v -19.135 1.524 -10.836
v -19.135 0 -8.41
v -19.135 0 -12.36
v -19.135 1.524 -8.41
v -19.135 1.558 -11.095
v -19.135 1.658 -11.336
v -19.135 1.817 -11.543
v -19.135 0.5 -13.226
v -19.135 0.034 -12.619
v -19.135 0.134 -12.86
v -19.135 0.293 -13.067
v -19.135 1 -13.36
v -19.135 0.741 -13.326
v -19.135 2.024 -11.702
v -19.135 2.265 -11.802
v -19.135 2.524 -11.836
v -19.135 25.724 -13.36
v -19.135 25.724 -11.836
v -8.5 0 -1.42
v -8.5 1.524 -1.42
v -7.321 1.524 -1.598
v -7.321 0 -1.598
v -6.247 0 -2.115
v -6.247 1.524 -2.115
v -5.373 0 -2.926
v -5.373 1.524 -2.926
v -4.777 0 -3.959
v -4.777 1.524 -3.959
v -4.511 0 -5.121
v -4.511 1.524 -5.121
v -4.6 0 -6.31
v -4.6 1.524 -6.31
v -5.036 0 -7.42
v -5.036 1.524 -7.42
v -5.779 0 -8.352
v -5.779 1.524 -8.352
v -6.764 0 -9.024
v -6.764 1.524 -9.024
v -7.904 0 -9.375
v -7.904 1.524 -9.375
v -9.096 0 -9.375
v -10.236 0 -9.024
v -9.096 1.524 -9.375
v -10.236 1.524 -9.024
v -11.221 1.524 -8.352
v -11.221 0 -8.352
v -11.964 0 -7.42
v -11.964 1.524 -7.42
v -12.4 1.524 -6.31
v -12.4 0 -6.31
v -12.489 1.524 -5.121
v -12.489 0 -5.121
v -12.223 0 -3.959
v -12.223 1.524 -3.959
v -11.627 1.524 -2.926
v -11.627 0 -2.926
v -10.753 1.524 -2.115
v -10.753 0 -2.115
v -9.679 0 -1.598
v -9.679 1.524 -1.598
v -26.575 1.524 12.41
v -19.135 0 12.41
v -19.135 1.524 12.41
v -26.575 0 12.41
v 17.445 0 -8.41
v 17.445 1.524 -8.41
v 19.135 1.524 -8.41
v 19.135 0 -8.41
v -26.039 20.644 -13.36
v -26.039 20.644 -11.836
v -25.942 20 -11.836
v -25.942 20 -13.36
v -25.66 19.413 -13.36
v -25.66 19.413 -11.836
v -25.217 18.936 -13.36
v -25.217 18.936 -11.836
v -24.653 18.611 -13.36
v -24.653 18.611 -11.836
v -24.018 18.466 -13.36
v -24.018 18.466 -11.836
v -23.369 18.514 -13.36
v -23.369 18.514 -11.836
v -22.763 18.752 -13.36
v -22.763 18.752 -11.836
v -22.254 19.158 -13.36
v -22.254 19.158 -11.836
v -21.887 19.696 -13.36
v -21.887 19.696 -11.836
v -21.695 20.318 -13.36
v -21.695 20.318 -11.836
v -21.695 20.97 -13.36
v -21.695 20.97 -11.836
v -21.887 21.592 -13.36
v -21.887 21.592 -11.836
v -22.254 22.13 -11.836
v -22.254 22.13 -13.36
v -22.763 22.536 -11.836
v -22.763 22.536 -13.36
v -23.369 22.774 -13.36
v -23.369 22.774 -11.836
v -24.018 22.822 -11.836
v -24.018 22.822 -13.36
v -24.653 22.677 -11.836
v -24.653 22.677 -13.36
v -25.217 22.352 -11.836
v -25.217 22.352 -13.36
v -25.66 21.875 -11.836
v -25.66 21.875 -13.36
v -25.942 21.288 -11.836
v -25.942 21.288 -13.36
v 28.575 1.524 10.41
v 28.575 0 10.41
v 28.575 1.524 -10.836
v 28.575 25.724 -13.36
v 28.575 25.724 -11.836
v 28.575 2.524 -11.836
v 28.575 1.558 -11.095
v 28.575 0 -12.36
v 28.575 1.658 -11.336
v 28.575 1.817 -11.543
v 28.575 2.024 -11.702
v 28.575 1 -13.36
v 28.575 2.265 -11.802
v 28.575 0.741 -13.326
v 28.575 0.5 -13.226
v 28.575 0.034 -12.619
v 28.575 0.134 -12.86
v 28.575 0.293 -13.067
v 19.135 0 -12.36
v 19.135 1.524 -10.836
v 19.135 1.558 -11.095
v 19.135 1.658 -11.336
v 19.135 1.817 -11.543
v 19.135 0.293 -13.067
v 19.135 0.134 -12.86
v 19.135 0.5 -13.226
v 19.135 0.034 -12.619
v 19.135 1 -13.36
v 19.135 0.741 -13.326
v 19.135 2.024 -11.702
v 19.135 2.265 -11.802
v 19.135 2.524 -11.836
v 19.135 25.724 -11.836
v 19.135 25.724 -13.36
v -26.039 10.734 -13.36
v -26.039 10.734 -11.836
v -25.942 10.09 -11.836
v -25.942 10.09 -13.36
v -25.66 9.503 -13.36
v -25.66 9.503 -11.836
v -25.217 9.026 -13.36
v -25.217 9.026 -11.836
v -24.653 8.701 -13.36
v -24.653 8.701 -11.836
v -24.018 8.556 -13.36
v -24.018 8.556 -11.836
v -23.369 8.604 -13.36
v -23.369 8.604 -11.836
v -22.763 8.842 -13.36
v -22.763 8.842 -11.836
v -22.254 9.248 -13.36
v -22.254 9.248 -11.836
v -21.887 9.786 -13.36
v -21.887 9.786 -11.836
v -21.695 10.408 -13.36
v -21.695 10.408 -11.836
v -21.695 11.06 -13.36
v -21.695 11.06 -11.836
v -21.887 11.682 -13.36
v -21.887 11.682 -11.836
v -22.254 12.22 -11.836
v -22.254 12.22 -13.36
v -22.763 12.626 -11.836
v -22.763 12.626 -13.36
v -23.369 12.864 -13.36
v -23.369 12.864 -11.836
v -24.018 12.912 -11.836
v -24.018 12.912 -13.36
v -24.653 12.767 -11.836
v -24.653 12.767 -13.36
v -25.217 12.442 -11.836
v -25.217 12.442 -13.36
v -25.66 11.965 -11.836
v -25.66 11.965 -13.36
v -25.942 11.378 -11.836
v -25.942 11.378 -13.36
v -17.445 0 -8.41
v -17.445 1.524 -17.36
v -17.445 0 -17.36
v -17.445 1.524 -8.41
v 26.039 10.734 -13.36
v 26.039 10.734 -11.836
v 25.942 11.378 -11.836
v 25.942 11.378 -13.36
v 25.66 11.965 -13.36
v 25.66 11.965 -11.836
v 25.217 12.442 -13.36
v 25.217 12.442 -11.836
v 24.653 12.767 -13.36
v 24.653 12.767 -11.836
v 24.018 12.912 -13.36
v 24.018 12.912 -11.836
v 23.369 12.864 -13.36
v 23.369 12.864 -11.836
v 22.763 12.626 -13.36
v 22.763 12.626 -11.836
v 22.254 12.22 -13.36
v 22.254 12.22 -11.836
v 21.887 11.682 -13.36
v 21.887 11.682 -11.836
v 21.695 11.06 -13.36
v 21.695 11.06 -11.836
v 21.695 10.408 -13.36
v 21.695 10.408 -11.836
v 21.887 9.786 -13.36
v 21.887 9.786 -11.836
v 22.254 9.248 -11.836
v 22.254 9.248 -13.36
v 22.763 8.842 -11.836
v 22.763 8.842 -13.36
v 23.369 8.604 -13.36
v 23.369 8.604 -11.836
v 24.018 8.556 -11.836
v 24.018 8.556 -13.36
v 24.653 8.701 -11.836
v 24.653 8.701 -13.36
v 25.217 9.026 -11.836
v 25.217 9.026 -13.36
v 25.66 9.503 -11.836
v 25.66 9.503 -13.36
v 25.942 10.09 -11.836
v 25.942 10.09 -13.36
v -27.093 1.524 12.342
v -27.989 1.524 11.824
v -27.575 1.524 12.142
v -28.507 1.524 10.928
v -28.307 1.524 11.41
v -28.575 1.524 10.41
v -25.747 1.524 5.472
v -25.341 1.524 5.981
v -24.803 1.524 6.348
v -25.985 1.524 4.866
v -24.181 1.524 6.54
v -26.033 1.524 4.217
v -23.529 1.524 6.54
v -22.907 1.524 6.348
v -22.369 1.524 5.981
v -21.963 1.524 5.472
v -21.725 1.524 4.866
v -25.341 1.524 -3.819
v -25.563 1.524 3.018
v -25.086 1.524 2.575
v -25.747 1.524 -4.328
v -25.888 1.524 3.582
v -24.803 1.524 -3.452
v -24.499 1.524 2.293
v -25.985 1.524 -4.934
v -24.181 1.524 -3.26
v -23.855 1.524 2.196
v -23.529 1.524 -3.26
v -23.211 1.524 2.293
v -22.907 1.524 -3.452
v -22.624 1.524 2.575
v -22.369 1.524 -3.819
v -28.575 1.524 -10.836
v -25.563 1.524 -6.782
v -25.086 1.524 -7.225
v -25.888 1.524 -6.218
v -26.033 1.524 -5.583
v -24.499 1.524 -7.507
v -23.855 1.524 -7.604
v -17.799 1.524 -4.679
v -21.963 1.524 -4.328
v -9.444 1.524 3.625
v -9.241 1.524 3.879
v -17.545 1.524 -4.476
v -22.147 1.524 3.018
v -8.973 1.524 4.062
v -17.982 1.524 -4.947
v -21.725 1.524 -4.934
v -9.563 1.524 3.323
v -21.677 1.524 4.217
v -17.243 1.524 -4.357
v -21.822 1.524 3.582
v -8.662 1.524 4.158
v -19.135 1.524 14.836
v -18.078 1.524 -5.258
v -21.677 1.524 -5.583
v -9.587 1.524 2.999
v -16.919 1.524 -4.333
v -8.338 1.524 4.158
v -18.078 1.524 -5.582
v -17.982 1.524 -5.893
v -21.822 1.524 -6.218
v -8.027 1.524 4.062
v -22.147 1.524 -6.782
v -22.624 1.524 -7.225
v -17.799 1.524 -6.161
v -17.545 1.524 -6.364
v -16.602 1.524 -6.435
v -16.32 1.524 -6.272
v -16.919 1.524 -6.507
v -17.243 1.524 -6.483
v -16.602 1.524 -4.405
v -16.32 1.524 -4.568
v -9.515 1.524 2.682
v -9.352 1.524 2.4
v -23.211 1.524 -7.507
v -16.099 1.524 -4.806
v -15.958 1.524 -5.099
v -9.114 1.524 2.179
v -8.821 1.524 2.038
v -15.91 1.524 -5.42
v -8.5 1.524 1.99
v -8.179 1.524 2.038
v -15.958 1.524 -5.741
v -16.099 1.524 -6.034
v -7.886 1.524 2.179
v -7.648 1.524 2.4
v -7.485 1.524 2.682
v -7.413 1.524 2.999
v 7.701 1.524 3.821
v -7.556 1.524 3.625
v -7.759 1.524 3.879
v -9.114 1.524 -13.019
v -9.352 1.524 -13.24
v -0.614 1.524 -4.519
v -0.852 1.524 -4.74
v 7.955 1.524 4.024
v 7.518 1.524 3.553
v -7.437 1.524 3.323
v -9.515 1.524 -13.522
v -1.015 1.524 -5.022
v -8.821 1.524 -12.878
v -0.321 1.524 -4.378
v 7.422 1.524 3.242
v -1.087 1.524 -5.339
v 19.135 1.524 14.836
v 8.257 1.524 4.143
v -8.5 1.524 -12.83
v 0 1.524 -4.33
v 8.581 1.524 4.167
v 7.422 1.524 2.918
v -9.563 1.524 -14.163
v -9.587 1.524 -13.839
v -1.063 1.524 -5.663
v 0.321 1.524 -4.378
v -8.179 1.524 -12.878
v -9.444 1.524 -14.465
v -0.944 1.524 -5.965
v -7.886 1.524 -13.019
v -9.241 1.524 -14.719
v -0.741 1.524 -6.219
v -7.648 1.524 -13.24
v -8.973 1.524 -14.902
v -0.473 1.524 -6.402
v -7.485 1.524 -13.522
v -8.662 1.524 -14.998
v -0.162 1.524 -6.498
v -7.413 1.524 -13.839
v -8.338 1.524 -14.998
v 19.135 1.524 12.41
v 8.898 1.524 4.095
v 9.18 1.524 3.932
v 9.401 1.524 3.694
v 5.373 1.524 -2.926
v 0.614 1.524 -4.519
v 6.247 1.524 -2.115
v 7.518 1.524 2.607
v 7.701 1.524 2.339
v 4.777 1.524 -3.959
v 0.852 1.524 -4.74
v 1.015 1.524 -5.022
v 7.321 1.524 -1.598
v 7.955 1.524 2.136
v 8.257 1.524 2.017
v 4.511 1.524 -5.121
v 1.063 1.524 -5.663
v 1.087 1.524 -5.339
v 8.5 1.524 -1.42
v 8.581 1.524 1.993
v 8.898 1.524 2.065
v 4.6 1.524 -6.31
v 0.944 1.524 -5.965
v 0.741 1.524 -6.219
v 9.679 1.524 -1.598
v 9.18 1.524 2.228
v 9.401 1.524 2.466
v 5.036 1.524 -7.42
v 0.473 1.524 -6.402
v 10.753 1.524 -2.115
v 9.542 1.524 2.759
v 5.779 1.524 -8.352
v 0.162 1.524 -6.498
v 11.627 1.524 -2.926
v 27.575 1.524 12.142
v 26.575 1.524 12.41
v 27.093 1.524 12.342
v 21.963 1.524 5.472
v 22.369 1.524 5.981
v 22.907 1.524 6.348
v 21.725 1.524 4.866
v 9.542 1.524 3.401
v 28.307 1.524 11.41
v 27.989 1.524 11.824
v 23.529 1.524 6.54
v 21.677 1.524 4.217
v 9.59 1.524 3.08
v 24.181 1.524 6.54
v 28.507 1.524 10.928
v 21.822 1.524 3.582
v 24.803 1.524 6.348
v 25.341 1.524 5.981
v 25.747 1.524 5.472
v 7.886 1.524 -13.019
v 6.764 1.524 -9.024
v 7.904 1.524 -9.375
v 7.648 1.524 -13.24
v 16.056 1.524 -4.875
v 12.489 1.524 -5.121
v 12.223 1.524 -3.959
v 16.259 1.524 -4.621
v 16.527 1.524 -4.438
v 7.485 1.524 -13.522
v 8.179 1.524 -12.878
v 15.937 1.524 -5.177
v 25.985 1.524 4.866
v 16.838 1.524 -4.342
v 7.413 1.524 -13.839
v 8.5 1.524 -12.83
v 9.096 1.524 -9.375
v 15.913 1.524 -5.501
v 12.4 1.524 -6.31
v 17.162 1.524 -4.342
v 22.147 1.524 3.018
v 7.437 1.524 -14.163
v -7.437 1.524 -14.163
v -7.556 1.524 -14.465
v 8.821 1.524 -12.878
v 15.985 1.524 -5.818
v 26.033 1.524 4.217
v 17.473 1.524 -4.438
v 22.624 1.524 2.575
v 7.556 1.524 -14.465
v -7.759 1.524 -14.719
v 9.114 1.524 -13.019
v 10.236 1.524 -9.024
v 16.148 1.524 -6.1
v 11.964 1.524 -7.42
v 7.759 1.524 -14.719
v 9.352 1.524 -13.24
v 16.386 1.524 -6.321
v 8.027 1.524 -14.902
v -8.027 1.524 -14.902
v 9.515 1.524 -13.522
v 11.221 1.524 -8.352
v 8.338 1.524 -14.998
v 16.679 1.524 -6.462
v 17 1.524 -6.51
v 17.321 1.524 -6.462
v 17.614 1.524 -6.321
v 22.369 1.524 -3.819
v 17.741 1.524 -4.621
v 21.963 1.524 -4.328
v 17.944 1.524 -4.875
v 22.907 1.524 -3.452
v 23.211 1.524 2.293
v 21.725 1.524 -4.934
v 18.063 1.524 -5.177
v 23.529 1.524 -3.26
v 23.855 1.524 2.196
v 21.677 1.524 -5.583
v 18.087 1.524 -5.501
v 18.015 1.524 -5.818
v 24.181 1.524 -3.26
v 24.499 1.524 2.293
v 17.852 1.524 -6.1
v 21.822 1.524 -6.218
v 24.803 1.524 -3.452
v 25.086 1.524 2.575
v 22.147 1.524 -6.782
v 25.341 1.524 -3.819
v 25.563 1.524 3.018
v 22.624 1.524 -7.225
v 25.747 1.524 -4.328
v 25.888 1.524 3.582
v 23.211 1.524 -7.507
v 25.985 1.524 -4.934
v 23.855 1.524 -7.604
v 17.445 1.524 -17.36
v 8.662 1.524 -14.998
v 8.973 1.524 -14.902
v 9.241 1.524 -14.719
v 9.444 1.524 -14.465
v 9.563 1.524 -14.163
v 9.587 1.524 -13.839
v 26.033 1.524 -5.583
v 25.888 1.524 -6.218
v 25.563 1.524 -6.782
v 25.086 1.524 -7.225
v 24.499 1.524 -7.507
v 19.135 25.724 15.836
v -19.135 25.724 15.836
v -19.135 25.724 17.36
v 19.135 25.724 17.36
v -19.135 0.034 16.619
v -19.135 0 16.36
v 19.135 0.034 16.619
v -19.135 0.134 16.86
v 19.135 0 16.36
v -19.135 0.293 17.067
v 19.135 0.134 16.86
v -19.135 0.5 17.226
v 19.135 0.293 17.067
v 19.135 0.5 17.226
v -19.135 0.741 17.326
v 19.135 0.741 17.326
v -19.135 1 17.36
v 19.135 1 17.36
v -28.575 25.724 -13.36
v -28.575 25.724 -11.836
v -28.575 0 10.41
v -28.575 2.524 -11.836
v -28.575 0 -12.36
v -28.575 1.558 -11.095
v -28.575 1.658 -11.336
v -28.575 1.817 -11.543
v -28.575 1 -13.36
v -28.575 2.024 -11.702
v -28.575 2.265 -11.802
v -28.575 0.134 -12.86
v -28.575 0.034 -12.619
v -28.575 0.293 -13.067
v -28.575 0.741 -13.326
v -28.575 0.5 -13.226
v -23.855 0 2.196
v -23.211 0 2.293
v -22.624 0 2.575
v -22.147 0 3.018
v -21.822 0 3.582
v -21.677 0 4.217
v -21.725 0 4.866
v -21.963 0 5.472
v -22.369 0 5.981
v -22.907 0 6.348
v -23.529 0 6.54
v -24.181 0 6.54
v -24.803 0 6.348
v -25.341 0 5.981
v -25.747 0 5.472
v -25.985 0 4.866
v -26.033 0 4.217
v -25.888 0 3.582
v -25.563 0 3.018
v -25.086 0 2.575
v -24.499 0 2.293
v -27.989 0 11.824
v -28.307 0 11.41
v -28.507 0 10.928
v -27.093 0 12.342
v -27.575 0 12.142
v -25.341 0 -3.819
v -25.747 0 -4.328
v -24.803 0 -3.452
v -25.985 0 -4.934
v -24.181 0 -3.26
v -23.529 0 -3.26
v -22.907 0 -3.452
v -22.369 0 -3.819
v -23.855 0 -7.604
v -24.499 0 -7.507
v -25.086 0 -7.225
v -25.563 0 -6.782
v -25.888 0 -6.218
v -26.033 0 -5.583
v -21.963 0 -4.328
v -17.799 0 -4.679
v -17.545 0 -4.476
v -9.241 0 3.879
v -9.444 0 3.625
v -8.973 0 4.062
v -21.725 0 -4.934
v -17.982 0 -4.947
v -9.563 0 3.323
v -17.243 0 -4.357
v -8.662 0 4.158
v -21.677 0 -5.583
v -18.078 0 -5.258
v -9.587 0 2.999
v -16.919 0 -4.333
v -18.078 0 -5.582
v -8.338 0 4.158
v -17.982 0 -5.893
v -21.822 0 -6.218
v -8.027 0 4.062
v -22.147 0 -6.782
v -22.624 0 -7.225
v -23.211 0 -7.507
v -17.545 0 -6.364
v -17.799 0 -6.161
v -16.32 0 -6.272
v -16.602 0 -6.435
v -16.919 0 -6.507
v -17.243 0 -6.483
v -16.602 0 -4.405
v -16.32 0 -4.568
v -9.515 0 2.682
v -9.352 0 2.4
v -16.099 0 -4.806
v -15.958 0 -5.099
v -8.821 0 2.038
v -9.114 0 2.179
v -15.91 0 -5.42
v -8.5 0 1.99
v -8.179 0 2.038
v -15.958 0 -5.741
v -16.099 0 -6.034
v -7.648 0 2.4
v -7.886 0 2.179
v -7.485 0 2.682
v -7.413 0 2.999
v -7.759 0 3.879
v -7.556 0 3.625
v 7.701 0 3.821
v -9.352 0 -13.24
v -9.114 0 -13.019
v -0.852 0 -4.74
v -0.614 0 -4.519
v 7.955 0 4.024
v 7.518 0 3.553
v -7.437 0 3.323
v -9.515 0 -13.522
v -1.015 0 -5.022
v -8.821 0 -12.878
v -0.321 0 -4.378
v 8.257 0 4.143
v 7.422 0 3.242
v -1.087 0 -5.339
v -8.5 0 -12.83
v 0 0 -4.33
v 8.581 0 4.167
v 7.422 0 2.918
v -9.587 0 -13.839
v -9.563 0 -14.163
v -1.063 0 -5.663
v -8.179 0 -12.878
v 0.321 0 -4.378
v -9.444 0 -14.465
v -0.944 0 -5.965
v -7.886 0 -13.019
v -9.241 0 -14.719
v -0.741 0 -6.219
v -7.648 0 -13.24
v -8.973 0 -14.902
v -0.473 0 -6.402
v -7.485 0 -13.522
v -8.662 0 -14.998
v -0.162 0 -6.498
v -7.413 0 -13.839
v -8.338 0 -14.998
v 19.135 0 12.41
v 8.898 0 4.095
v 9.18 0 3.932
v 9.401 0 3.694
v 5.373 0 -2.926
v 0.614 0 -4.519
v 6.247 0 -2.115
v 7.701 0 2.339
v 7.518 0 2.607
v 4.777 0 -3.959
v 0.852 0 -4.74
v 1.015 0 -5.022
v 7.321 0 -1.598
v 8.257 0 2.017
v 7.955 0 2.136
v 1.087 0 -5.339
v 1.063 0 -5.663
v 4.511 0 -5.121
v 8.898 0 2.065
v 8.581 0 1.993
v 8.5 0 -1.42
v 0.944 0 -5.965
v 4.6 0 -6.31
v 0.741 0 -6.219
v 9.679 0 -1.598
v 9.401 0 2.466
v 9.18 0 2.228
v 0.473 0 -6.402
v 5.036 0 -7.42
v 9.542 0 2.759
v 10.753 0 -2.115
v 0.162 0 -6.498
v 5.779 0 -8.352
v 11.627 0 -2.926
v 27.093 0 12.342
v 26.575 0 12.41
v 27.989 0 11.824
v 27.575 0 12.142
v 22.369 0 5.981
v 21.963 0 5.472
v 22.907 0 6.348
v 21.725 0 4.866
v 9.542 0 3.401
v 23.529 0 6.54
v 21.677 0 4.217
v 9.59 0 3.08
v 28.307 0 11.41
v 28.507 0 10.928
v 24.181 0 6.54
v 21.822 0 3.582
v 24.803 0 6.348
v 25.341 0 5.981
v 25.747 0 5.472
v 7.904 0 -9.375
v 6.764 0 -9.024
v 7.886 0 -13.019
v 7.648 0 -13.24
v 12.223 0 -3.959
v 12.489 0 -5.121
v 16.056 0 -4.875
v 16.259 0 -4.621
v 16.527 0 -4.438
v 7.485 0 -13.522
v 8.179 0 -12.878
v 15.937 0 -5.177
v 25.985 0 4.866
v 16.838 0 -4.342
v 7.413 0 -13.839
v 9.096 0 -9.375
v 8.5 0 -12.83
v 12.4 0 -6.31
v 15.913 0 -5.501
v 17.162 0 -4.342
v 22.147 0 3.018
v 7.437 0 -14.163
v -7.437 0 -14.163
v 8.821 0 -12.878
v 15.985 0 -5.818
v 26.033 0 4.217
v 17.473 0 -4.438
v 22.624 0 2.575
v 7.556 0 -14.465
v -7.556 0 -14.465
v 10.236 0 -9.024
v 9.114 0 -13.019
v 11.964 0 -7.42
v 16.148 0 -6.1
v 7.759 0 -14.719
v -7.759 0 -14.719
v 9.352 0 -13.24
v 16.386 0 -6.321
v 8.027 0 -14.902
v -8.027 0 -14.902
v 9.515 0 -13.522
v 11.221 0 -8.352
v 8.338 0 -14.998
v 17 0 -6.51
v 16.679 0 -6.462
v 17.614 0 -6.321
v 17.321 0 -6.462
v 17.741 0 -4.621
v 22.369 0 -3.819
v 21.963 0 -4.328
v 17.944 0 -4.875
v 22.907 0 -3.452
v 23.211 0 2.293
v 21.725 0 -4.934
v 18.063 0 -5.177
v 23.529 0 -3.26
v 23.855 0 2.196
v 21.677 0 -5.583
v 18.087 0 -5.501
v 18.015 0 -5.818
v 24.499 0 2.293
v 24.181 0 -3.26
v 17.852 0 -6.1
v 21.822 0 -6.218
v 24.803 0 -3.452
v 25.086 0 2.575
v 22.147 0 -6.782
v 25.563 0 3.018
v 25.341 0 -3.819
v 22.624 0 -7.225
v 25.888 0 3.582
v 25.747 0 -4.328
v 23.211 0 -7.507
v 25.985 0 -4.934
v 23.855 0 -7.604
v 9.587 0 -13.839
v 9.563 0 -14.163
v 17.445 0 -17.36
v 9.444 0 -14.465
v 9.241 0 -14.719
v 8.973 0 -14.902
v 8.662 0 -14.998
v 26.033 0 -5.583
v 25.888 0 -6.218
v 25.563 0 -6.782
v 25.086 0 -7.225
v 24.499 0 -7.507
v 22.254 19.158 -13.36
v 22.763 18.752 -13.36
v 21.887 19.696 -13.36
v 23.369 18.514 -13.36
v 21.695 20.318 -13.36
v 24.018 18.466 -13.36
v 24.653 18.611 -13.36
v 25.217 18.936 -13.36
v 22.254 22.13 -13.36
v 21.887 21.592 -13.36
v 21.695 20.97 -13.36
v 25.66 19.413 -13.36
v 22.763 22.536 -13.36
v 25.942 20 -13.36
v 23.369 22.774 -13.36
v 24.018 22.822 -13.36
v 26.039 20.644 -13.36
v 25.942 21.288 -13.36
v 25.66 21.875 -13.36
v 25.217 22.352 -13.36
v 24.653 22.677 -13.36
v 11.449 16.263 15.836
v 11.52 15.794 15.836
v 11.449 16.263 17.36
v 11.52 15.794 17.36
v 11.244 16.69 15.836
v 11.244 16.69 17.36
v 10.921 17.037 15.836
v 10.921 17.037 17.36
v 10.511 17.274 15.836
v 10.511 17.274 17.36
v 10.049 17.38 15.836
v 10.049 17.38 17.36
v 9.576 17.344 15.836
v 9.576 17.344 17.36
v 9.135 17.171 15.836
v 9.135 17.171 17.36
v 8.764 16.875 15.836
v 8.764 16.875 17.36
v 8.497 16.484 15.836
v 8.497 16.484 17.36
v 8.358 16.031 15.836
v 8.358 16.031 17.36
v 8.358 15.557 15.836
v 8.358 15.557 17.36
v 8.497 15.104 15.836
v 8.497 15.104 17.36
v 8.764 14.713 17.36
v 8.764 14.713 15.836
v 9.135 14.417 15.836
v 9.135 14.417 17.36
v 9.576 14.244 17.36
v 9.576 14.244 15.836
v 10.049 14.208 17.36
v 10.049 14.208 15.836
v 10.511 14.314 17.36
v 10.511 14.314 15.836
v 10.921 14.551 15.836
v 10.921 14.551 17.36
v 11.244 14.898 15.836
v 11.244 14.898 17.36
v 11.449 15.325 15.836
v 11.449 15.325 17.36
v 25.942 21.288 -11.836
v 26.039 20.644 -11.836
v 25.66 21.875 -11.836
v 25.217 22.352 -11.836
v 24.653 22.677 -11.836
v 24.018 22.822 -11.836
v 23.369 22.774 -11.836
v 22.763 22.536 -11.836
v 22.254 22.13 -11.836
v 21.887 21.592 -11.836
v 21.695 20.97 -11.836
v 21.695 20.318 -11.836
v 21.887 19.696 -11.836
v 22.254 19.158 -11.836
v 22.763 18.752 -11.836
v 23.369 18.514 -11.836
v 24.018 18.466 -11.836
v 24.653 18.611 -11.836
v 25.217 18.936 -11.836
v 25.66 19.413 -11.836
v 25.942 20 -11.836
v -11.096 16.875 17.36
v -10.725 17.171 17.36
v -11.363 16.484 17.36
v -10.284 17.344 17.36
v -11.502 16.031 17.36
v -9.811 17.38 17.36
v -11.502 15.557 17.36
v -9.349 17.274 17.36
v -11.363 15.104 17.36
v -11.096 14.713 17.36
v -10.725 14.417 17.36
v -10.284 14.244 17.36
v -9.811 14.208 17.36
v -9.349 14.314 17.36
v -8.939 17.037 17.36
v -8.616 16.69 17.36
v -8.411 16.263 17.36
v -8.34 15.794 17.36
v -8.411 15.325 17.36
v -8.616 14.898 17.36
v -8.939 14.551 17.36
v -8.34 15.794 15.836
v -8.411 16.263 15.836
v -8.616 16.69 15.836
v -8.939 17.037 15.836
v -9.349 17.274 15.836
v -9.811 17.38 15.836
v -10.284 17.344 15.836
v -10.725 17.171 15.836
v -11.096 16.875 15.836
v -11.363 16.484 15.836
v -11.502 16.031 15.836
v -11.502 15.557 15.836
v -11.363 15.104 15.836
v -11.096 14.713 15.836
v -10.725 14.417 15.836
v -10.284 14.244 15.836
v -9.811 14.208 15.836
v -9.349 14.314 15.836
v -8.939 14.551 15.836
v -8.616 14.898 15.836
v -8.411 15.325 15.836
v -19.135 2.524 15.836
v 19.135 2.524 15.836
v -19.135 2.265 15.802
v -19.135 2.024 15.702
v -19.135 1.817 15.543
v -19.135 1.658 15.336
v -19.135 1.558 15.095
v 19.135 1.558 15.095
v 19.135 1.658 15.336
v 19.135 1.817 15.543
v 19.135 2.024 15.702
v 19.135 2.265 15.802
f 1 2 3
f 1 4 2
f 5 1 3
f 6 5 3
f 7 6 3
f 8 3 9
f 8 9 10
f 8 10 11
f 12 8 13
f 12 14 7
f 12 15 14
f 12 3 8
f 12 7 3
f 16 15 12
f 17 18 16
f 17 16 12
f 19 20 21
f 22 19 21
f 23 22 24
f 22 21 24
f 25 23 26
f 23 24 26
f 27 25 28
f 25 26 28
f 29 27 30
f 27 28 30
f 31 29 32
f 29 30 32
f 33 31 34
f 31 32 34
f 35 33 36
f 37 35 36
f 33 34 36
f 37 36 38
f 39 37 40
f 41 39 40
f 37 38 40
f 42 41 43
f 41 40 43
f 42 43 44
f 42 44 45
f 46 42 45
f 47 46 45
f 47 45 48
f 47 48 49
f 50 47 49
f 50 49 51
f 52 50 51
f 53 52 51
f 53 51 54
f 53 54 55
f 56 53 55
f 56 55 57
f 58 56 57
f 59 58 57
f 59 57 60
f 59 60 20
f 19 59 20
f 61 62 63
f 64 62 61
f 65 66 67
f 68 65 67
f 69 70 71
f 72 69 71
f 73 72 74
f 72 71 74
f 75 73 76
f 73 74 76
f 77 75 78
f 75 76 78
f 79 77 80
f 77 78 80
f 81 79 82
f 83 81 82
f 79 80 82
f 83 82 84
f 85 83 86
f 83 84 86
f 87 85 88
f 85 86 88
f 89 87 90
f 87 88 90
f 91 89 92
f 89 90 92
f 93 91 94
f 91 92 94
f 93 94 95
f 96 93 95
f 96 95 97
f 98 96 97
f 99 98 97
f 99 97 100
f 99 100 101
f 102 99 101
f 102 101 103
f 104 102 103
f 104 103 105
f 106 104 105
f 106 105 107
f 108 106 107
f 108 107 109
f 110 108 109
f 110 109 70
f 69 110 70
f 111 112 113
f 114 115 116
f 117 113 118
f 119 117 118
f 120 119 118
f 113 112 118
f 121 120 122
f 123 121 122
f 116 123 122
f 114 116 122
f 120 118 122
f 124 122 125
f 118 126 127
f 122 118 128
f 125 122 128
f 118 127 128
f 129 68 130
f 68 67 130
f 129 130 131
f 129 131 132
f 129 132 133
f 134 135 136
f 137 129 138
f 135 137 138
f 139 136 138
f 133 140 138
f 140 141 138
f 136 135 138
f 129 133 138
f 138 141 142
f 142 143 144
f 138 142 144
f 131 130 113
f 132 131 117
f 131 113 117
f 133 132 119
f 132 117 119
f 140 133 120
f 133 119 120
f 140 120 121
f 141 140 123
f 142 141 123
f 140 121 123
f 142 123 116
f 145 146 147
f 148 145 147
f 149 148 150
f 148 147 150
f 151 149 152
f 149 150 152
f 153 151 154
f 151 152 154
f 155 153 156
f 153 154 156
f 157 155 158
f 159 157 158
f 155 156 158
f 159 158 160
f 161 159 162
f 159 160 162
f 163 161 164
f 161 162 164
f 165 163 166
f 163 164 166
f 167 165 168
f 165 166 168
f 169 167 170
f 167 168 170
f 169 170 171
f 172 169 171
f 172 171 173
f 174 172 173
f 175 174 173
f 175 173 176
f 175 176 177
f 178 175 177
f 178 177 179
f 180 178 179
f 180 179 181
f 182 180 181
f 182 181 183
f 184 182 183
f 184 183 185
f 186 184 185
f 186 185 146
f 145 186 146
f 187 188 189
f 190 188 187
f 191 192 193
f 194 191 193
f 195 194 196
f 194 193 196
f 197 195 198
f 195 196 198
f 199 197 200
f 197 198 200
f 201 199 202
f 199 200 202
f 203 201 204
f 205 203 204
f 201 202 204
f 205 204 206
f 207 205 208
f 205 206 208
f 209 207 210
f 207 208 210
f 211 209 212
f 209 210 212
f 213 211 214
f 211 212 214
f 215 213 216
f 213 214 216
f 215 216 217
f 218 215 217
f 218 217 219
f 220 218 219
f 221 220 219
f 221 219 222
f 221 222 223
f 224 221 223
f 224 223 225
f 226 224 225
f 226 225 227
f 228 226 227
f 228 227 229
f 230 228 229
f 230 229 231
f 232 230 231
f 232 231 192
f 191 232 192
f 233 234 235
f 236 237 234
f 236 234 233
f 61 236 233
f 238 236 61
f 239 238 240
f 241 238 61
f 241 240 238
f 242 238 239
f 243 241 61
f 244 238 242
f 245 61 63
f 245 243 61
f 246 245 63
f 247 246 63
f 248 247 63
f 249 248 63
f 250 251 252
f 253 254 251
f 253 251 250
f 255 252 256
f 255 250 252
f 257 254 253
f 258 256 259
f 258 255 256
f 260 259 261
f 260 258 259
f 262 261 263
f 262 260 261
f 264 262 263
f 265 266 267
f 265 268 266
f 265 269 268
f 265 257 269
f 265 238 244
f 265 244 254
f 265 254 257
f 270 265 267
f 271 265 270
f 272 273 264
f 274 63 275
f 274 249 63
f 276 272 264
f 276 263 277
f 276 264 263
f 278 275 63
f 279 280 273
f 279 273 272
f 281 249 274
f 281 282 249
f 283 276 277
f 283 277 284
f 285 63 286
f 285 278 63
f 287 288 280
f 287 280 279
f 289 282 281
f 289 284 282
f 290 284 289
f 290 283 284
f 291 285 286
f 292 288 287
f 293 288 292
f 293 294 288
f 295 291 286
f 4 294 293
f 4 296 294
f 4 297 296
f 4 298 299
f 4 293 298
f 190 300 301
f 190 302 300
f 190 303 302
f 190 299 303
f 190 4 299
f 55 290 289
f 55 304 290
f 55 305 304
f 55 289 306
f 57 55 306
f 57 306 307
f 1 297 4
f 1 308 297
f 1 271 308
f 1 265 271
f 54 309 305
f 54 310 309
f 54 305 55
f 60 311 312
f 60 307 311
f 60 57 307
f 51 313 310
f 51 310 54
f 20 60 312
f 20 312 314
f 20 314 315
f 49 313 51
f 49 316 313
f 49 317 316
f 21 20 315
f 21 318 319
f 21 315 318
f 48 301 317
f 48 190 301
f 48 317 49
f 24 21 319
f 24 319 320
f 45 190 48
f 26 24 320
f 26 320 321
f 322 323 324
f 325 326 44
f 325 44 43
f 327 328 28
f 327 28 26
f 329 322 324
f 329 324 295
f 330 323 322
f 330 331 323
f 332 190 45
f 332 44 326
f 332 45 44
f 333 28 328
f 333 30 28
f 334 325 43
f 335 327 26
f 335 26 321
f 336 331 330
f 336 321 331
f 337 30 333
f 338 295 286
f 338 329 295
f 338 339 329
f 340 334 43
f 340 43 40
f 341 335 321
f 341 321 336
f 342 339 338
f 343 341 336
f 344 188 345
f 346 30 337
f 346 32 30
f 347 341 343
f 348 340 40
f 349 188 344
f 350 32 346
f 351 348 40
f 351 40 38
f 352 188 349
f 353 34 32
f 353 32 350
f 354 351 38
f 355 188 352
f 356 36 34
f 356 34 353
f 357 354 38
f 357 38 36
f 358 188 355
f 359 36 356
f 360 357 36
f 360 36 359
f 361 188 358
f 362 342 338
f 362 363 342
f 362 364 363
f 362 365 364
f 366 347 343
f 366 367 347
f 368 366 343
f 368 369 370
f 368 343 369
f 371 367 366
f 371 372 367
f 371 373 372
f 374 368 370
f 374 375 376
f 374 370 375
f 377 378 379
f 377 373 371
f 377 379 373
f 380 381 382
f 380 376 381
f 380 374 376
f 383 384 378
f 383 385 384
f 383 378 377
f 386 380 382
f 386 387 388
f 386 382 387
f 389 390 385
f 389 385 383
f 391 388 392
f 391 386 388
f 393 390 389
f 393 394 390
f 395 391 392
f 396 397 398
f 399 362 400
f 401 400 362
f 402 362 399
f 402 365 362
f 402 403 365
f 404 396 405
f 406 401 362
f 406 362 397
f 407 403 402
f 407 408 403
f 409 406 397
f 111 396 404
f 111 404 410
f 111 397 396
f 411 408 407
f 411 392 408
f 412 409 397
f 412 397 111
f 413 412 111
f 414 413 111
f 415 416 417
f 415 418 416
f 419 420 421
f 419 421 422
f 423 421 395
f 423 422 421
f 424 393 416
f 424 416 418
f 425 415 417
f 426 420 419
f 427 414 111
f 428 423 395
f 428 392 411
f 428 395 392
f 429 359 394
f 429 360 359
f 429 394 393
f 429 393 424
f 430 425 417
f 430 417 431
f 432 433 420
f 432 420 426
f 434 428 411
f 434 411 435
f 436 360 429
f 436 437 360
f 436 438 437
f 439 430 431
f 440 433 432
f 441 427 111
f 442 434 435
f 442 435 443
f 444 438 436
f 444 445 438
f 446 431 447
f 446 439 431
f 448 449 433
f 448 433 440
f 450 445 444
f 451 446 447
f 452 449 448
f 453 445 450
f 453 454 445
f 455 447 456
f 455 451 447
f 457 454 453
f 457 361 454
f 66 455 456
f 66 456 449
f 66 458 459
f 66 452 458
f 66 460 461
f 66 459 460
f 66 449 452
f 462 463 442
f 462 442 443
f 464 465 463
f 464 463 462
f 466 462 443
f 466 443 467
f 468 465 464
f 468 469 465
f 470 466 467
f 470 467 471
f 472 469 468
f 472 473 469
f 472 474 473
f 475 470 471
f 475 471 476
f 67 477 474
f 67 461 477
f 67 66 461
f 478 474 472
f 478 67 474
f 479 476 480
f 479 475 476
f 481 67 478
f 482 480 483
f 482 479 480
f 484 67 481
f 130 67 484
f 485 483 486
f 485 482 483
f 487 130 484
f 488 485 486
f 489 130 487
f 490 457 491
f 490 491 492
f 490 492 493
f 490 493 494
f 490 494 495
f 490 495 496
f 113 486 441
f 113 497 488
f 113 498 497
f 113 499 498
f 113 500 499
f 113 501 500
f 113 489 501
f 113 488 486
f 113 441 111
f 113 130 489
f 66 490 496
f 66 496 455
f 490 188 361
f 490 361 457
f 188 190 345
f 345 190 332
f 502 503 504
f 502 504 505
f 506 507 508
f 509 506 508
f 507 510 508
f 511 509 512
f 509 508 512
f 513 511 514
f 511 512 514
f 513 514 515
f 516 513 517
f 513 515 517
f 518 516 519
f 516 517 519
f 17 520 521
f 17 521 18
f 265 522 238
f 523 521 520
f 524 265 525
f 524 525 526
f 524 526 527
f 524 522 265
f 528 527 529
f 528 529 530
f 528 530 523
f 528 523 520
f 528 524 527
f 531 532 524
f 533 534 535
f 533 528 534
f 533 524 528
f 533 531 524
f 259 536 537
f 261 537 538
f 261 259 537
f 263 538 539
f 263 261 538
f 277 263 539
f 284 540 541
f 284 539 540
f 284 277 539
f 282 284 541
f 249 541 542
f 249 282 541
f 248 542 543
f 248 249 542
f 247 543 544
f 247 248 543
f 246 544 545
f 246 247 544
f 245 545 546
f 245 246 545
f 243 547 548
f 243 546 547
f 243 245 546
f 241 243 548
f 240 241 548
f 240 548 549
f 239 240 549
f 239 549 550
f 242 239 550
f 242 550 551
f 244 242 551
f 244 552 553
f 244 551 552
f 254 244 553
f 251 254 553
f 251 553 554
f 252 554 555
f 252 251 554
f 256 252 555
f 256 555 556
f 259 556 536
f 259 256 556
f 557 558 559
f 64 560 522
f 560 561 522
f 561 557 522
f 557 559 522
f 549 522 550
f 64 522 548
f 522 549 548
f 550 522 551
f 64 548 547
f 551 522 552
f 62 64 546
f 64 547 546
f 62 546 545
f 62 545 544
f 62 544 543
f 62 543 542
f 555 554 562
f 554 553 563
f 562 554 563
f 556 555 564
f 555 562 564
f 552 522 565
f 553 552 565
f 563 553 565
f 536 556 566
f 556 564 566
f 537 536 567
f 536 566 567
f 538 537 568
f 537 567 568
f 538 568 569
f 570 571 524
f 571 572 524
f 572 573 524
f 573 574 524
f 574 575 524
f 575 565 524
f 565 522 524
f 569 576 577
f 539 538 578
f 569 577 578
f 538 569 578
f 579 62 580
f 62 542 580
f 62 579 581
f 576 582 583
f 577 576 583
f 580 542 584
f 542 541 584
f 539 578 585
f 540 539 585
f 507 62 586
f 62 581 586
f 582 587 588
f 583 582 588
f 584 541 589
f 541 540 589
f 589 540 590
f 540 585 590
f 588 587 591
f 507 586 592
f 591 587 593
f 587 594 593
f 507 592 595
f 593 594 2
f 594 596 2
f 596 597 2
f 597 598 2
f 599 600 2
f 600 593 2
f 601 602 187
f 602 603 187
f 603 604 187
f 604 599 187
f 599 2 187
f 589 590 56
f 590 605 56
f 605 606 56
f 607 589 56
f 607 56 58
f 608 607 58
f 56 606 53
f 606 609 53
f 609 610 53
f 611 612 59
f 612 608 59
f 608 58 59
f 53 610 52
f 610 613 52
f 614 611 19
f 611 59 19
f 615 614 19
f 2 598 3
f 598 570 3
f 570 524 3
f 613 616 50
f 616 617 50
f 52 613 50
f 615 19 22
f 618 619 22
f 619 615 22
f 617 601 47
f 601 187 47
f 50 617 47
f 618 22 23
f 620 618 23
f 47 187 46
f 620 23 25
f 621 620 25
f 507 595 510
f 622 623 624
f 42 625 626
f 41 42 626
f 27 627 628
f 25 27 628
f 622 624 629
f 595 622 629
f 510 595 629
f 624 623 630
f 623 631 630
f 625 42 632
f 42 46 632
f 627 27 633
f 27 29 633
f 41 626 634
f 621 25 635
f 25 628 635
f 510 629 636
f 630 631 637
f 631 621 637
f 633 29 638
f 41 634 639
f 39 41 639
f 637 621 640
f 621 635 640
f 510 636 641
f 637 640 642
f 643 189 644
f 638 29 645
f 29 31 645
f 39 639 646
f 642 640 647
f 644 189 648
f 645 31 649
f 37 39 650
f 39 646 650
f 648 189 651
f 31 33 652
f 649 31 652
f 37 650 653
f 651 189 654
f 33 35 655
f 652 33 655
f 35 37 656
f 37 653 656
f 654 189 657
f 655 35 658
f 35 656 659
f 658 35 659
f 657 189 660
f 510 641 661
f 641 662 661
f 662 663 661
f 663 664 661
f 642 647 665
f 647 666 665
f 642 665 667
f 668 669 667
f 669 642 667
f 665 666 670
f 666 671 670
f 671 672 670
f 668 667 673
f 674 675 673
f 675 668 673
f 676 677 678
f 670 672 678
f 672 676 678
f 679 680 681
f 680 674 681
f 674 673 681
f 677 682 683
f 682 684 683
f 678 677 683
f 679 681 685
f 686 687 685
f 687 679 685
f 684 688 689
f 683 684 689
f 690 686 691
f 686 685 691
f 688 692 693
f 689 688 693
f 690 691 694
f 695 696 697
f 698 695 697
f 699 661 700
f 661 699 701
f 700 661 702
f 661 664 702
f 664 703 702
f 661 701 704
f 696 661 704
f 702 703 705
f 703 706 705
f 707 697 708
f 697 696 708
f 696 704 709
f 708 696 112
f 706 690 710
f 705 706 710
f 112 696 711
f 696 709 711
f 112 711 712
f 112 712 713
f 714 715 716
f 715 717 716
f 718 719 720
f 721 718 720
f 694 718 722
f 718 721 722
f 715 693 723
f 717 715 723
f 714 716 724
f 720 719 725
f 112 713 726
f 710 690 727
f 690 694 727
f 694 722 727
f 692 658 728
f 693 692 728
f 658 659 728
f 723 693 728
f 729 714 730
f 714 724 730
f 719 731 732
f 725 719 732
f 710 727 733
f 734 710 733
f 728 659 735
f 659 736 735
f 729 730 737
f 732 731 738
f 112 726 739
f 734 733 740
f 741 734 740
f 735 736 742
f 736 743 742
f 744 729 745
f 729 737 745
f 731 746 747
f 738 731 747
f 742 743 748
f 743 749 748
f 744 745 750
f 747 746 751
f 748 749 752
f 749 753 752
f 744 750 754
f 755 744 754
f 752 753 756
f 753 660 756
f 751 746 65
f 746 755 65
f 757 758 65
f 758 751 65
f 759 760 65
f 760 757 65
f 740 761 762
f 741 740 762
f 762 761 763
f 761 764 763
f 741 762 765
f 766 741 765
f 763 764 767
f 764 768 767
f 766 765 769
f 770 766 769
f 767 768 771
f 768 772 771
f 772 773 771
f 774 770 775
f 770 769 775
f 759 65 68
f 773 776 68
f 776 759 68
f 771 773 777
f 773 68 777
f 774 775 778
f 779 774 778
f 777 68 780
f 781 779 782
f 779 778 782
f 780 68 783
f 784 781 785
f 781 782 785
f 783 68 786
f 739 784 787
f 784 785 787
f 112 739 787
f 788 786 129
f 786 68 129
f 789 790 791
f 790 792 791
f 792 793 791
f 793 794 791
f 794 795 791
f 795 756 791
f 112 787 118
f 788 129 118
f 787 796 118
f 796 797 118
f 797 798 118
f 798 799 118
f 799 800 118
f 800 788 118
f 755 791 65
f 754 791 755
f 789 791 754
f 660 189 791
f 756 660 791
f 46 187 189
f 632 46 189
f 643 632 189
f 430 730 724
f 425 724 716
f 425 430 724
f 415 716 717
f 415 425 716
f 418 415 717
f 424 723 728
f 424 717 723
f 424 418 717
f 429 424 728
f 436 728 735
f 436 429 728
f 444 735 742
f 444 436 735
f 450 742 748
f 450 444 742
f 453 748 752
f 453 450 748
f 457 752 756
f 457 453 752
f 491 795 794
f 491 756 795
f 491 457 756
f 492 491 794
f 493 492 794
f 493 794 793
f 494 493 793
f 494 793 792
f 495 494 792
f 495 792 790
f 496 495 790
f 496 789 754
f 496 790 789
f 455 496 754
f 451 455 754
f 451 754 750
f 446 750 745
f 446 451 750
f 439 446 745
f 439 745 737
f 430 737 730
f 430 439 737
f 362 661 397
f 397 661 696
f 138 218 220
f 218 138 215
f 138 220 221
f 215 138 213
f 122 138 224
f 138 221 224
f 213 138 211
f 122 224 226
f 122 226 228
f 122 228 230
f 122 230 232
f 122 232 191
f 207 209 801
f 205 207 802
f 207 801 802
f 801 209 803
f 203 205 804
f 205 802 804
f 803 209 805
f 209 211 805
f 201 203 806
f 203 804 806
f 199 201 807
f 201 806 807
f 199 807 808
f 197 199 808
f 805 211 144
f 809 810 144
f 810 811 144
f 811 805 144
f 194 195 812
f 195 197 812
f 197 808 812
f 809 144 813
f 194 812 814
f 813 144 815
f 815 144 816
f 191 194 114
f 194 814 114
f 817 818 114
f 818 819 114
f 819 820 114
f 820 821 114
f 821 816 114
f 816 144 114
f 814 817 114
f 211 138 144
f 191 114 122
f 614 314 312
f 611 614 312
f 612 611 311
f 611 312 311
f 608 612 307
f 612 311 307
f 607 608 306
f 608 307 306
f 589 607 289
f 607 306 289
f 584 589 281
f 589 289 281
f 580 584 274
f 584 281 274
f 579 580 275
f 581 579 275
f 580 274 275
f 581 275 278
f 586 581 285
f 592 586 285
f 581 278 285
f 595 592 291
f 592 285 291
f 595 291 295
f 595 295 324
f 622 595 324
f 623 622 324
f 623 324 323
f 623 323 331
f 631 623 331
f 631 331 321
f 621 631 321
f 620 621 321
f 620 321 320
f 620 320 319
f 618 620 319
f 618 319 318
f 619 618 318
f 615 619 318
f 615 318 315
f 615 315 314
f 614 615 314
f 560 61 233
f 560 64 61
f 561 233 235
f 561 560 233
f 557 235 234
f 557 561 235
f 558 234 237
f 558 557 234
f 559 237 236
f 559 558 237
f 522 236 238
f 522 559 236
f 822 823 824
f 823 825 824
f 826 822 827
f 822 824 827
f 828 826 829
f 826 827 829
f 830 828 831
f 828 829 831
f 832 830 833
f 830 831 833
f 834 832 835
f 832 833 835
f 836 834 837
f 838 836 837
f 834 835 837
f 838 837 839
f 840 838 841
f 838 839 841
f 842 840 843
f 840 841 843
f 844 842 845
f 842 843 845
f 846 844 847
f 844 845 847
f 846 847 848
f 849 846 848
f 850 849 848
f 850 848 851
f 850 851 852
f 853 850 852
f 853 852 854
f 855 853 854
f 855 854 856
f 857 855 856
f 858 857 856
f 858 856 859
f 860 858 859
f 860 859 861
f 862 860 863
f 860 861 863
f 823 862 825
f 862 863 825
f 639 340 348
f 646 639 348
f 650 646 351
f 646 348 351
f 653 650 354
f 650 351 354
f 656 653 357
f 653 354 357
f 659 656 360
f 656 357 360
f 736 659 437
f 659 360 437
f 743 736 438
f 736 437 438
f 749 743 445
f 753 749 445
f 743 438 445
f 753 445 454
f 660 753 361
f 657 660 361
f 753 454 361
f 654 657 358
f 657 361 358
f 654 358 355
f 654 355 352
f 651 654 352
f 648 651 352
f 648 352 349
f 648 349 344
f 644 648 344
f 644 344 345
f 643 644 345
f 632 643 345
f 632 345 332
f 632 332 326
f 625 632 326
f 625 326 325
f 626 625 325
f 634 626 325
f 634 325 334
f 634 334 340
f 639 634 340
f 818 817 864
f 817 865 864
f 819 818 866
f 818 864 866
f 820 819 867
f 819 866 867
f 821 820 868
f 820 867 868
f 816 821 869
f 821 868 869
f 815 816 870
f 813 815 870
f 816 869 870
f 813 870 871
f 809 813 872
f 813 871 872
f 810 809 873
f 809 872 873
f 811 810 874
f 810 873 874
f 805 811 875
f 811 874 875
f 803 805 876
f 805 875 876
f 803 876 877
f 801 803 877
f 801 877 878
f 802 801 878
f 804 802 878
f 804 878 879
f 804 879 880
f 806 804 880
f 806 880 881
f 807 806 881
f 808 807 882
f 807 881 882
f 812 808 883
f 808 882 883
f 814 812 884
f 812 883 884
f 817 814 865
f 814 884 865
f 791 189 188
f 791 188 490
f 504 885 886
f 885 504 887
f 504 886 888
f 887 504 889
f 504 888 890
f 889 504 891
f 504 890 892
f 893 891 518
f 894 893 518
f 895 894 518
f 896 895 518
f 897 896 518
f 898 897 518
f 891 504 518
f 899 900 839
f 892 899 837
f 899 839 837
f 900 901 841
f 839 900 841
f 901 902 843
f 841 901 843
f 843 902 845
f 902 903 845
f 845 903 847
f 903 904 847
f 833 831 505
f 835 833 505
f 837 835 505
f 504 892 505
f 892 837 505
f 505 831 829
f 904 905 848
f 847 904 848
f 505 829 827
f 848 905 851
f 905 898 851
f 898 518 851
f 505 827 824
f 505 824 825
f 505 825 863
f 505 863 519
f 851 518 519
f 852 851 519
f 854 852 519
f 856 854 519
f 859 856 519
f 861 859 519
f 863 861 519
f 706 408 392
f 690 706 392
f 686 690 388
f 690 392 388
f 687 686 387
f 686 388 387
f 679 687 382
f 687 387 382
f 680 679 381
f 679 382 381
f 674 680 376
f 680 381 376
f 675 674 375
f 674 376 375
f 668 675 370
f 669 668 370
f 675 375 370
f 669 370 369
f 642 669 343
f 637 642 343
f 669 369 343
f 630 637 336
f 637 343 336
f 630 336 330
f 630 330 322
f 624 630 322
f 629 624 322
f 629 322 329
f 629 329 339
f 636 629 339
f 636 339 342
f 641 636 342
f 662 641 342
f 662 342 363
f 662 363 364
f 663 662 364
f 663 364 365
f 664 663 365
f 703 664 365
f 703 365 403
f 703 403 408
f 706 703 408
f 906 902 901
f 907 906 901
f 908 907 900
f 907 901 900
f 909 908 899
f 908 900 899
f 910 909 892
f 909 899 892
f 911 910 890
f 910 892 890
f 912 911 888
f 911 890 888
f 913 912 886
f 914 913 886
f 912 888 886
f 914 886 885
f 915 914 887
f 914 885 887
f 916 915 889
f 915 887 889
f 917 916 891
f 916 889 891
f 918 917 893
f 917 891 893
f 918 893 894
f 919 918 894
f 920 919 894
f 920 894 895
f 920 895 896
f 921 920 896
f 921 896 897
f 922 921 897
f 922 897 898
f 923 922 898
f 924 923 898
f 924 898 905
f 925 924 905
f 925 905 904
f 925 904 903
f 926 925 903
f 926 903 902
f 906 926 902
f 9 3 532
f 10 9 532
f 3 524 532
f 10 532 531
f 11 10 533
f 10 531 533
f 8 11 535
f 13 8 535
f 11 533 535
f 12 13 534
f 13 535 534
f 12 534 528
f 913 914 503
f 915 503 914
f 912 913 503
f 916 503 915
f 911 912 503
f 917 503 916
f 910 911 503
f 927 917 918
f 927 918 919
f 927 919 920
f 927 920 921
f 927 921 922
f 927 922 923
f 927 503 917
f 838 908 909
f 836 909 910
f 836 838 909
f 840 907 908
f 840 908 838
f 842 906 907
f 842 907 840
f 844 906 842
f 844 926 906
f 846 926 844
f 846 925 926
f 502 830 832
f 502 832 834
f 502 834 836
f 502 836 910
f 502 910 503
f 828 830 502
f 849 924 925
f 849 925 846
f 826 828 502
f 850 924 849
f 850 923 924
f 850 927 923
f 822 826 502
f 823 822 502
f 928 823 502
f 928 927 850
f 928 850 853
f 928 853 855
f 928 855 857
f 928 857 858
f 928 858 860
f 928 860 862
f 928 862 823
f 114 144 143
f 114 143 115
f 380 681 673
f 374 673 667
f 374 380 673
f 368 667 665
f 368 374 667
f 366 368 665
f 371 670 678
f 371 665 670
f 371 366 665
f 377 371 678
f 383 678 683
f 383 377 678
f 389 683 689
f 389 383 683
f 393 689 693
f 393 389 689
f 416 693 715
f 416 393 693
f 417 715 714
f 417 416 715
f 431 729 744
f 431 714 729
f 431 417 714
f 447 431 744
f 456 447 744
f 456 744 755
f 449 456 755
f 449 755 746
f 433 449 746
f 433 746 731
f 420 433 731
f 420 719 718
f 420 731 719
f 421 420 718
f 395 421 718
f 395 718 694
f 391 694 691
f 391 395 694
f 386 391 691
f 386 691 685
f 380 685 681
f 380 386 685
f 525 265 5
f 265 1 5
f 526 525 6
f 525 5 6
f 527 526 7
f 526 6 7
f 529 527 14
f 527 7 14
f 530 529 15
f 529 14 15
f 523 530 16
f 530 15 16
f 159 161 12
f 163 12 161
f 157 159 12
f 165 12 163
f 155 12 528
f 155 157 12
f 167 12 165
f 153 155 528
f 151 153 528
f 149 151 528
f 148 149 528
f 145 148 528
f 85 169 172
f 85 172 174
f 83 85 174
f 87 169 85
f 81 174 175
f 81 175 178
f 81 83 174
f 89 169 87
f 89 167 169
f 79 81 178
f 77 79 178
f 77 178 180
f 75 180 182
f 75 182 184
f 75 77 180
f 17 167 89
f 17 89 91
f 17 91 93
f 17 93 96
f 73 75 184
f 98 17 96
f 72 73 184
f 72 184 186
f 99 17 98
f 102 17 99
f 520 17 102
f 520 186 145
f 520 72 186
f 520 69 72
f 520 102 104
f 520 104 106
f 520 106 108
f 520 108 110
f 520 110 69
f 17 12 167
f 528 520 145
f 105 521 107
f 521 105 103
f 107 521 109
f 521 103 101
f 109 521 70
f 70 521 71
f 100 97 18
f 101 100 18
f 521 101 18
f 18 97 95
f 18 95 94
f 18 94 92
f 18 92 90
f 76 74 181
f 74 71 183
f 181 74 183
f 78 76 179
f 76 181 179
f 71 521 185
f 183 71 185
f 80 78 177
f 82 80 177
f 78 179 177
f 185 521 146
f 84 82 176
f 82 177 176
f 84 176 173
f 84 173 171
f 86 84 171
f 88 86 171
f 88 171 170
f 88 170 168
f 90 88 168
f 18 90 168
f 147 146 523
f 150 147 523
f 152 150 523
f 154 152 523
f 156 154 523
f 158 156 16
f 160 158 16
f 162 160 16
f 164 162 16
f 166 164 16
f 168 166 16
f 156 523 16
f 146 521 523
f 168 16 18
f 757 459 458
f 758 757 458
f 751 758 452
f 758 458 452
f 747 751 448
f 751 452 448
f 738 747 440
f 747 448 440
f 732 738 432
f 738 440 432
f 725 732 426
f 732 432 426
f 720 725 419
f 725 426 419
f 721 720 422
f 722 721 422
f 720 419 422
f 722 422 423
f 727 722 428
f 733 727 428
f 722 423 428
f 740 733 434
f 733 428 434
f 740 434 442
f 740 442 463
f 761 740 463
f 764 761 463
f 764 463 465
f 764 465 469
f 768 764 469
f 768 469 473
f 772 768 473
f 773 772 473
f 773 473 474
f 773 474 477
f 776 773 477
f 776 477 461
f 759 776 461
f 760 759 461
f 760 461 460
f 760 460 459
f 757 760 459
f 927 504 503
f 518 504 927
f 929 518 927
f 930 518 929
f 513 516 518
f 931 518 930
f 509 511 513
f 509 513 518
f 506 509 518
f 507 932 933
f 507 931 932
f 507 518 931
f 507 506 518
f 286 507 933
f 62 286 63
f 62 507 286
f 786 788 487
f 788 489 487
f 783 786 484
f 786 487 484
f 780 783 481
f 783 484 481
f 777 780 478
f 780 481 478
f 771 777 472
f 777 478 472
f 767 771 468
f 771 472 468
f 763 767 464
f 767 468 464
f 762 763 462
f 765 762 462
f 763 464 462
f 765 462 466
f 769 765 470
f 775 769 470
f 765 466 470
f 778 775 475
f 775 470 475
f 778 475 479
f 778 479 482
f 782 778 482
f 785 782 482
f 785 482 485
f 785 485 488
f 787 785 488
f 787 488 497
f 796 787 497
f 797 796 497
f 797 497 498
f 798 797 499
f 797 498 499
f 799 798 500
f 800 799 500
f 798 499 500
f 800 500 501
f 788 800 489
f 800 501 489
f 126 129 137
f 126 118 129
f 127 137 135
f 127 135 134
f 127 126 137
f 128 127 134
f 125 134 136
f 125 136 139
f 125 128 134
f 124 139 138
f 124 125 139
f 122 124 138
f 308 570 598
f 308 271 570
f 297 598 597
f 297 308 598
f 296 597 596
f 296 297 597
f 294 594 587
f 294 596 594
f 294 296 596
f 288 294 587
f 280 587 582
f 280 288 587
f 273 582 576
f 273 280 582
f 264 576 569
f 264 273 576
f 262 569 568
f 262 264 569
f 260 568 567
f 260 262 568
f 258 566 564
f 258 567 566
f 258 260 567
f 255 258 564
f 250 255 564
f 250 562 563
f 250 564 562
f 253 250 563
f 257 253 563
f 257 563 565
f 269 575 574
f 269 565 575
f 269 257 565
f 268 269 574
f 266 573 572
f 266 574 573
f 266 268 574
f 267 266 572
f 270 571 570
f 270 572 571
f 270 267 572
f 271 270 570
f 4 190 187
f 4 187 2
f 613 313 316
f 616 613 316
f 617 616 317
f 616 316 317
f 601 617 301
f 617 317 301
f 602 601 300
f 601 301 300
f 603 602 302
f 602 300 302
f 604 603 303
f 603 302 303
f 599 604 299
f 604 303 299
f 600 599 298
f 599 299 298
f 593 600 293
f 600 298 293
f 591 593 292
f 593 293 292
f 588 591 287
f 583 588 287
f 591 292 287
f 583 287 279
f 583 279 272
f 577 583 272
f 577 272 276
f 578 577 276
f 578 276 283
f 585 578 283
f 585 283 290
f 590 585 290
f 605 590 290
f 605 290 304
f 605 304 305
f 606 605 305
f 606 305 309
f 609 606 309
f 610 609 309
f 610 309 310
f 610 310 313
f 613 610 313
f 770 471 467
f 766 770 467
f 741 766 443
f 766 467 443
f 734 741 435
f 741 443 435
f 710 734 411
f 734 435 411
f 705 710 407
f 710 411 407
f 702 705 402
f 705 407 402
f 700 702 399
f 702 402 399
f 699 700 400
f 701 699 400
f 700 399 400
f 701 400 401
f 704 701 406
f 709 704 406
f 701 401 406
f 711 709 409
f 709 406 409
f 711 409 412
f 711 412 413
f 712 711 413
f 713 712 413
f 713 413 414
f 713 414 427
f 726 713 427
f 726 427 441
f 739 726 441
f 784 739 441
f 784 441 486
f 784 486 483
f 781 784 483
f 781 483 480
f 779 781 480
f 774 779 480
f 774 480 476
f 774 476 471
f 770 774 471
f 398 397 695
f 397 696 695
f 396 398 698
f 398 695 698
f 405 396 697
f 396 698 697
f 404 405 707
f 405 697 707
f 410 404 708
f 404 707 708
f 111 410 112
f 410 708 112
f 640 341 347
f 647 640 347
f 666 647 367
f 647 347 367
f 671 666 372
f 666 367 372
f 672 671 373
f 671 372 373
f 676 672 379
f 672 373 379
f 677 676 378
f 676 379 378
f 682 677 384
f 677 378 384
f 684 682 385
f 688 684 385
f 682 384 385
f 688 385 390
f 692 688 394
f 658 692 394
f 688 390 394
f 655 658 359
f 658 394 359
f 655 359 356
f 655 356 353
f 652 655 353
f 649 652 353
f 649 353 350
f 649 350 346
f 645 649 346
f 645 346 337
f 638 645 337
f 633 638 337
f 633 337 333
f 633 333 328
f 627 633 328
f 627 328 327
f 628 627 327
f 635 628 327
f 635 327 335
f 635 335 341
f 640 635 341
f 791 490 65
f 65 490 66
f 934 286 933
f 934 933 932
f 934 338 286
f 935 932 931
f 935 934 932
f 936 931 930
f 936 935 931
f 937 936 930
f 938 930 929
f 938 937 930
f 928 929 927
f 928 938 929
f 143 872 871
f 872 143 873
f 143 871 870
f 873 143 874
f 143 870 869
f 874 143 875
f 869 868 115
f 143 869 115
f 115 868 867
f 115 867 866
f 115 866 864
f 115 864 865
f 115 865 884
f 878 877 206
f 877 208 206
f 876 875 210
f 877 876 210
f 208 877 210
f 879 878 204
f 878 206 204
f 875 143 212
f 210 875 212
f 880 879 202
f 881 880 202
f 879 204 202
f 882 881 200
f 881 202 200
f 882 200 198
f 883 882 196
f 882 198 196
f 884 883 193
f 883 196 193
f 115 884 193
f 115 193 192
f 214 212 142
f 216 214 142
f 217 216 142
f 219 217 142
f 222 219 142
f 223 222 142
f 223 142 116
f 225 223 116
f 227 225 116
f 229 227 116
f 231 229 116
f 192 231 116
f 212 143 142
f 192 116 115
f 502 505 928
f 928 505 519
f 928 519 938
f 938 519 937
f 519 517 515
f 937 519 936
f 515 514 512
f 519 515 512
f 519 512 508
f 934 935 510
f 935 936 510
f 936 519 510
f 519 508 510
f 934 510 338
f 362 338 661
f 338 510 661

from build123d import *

# Parameters (mm, degrees)
SKETCH1_W               = 57.15
SKETCH1_H               = 34.72
BOSS_EXTRUDE1_DEPTH     = 1.524
SKETCH2_W               = 9.44
SKETCH2_H               = 4.95
CUT_EXTRUDE1_DEPTH      = 5
SKETCH3_R               = 2.1844
CUT_EXTRUDE2_DEPTH      = 5
SKETCH4_W               = 38.27
SKETCH4_H               = 1.524
SKETCH4_W_2             = 9.44
BOSS_EXTRUDE2_DEPTH     = 24.2
SKETCH5_R               = 1.59
CUT_EXTRUDE3_DEPTH      = 12.1
SKETCH6_R               = 1.09
CUT_EXTRUDE4_DEPTH      = 24.2
SKETCH7_R               = 4
CUT_EXTRUDE5_DEPTH      = 24.2
SKETCH8_R               = 1.09
CUT_EXTRUDE6_DEPTH      = 24.2
CIRPATTERN1_COUNT       = 4
MIRROR3_COPY_1_SKETCH_R = 1.09
MIRROR3_COPY_1_DEPTH    = 24.2
MIRROR3_COPY_2_SKETCH_R = 1.09
MIRROR3_COPY_2_DEPTH    = 24.2
SKETCH9_R               = 2.1844
CUT_EXTRUDE7_DEPTH      = 12.1
FILLET1_R               = 2
FILLET2_R               = 1


with BuildPart() as part:
    # Sketch1 → Boss-Extrude1 (new body)
    with BuildSketch(Plane(origin=(0, 0, 0), x_dir=(1, 0, 0), z_dir=(0, 1, 0))):
        Rectangle(SKETCH1_W, SKETCH1_H)
    extrude(amount=BOSS_EXTRUDE1_DEPTH)

    # Sketch2 → Cut-Extrude1 (cut, symmetric)
    with BuildSketch(Plane(origin=(0, 1.524, 0), x_dir=(1, 0, 0), z_dir=(0, 1, 0))):
        with Locations((23.855, -14.885)):
            Rectangle(SKETCH2_W, SKETCH2_H)
        Polygon((28.575, 17.36), (17.445, 17.36), (17.445, 8.41), (19.135, 8.41), (19.135, 13.36), (28.575, 13.36), align=None)
    cut_extrude1 = extrude(amount=CUT_EXTRUDE1_DEPTH, both=True, mode=Mode.SUBTRACT)

    # Mirror1: Cut-Extrude1 across plane
    add(cut_extrude1.mirror(Plane(origin=(0, 0, 0), x_dir=(0, 0, 1), z_dir=(1, 0, 0))), mode=Mode.SUBTRACT)

    # Sketch3 → Cut-Extrude2 (cut, symmetric)
    with BuildSketch(Plane(origin=(0, 1.524, 0), x_dir=(1, 0, 0), z_dir=(0, 1, 0))):
        with Locations(Location((23.855, -4.38, 0), (0, 0, 90))):
            Circle(SKETCH3_R)
        with Locations(Location((23.855, 5.42, 0), (0, 0, 90))):
            Circle(SKETCH3_R)
    cut_extrude2 = extrude(amount=CUT_EXTRUDE2_DEPTH, both=True, mode=Mode.SUBTRACT)

    # Mirror2: Cut-Extrude2 across plane
    add(cut_extrude2.mirror(Plane(origin=(0, 0, 0), x_dir=(0, 0, 1), z_dir=(1, 0, 0))), mode=Mode.SUBTRACT)

    # Sketch4 → Boss-Extrude2 (add)
    with BuildSketch(Plane(origin=(0, 1.524, 0), x_dir=(1, 0, 0), z_dir=(0, 1, 0))):
        with Locations((0, -16.598)):
            Rectangle(SKETCH4_W, SKETCH4_H)
        with Locations((-23.855, 12.598)):
            Rectangle(SKETCH4_W_2, SKETCH4_H)
        with Locations((23.855, 12.598)):
            Rectangle(SKETCH4_W_2, SKETCH4_H)
    extrude(amount=BOSS_EXTRUDE2_DEPTH)

    # Sketch5 → Cut-Extrude3 (cut, symmetric)
    with BuildSketch(Plane.XY.offset(17.36)):
        with Locations((-9.93, 15.794)):
            Circle(SKETCH5_R)
        with Locations((9.93, 15.794)):
            Circle(SKETCH5_R)
    extrude(amount=CUT_EXTRUDE3_DEPTH, both=True, mode=Mode.SUBTRACT)

    # Sketch6 → Cut-Extrude4 (cut)
    with BuildSketch(Plane(origin=(0, 1.524, 0), x_dir=(1, 0, 0), z_dir=(0, 1, 0))):
        with Locations(Location((0, 5.42, 0), (0, 0, 270))):
            Circle(SKETCH6_R)
    extrude(amount=-CUT_EXTRUDE4_DEPTH, mode=Mode.SUBTRACT)

    # Sketch7 → Cut-Extrude5 (cut)
    with BuildSketch(Plane(origin=(0, 1.524, 0), x_dir=(1, 0, 0), z_dir=(0, 1, 0))):
        with Locations(Location((-8.5, 5.42, 0), (0, 0, 270))):
            Circle(SKETCH7_R)
    cut_extrude5 = extrude(amount=-CUT_EXTRUDE5_DEPTH, mode=Mode.SUBTRACT)

    # Sketch8 → Cut-Extrude6 (cut)
    with BuildSketch(Plane(origin=(0, 1.524, 0), x_dir=(1, 0, 0), z_dir=(0, 1, 0))):
        with Locations(Location((-8.5, 13.92, 0), (0, 0, 270))):
            Circle(SKETCH8_R)
    cut_extrude6 = extrude(amount=-CUT_EXTRUDE6_DEPTH, mode=Mode.SUBTRACT)

    # CirPattern1: Cut-Extrude6 ×4 about axis, 1 skipped
    cirpattern1_axis = Axis((-8.5, 0, -5.42), (0, 1, 0))
    add([cut_extrude6.rotate(cirpattern1_axis, i * 360 / CIRPATTERN1_COUNT) for i in range(1, CIRPATTERN1_COUNT) if i not in (3,)], mode=Mode.SUBTRACT)

    # Mirror3: Cut-Extrude5, Cut-Extrude6 across plane
    add(cut_extrude5.mirror(Plane(origin=(0, 0, 0), x_dir=(0, 0, 1), z_dir=(1, 0, 0))), mode=Mode.SUBTRACT)
    add(cut_extrude6.mirror(Plane(origin=(0, 0, 0), x_dir=(0, 0, 1), z_dir=(1, 0, 0))), mode=Mode.SUBTRACT)

    # Mirror3 copy 1 sketch → Mirror3 copy 1 (cut)
    with BuildSketch(Plane(origin=(3.08, 1.524, -13.92), x_dir=(0, 0, -1), z_dir=(0, 1, 0))):
        with Locations((-8.5, -13.92)):
            Circle(MIRROR3_COPY_1_SKETCH_R)
    extrude(amount=-MIRROR3_COPY_1_DEPTH, mode=Mode.SUBTRACT)

    # Mirror3 copy 2 sketch → Mirror3 copy 2 (cut)
    with BuildSketch(Plane(origin=(17, 1.524, -10.84), x_dir=(1, 0, 0), z_dir=(0, 1, 0))):
        with Locations((-8.5, -13.92)):
            Circle(MIRROR3_COPY_2_SKETCH_R)
    extrude(amount=-MIRROR3_COPY_2_DEPTH, mode=Mode.SUBTRACT)

    # Sketch9 → Cut-Extrude7 (cut, symmetric)
    with BuildSketch(Plane.XY.offset(-11.836)):
        with Locations(Location((-23.855, 20.644, 0), (0, 0, 180))):
            Circle(SKETCH9_R)
        with Locations(Location((-23.855, 10.734, 0), (0, 0, 180))):
            Circle(SKETCH9_R)
        with Locations((23.855, 10.734)):
            Circle(SKETCH9_R)
        with Locations((23.855, 20.644)):
            Circle(SKETCH9_R)
    extrude(amount=CUT_EXTRUDE7_DEPTH, both=True, mode=Mode.SUBTRACT)

    # Fillet1
    fillet1_edges = [part.edges().sort_by_distance(p)[0] for p in [
        (28.575, 0.762, 12.41),
        (-28.575, 0.762, 12.41),
    ]]
    fillet(fillet1_edges, radius=FILLET1_R)

    # Fillet2
    fillet2_edges = [part.edges().sort_by_distance(p)[0] for p in [
        (0, 0, 17.36),
        (23.855, 0, -13.36),
        (-23.855, 0, -13.36),
        (0, 1.524, 15.836),
        (23.855, 1.524, -11.836),
        (-23.855, 1.524, -11.836),
    ]]
    fillet(fillet2_edges, radius=FILLET2_R)


solid = part.part
